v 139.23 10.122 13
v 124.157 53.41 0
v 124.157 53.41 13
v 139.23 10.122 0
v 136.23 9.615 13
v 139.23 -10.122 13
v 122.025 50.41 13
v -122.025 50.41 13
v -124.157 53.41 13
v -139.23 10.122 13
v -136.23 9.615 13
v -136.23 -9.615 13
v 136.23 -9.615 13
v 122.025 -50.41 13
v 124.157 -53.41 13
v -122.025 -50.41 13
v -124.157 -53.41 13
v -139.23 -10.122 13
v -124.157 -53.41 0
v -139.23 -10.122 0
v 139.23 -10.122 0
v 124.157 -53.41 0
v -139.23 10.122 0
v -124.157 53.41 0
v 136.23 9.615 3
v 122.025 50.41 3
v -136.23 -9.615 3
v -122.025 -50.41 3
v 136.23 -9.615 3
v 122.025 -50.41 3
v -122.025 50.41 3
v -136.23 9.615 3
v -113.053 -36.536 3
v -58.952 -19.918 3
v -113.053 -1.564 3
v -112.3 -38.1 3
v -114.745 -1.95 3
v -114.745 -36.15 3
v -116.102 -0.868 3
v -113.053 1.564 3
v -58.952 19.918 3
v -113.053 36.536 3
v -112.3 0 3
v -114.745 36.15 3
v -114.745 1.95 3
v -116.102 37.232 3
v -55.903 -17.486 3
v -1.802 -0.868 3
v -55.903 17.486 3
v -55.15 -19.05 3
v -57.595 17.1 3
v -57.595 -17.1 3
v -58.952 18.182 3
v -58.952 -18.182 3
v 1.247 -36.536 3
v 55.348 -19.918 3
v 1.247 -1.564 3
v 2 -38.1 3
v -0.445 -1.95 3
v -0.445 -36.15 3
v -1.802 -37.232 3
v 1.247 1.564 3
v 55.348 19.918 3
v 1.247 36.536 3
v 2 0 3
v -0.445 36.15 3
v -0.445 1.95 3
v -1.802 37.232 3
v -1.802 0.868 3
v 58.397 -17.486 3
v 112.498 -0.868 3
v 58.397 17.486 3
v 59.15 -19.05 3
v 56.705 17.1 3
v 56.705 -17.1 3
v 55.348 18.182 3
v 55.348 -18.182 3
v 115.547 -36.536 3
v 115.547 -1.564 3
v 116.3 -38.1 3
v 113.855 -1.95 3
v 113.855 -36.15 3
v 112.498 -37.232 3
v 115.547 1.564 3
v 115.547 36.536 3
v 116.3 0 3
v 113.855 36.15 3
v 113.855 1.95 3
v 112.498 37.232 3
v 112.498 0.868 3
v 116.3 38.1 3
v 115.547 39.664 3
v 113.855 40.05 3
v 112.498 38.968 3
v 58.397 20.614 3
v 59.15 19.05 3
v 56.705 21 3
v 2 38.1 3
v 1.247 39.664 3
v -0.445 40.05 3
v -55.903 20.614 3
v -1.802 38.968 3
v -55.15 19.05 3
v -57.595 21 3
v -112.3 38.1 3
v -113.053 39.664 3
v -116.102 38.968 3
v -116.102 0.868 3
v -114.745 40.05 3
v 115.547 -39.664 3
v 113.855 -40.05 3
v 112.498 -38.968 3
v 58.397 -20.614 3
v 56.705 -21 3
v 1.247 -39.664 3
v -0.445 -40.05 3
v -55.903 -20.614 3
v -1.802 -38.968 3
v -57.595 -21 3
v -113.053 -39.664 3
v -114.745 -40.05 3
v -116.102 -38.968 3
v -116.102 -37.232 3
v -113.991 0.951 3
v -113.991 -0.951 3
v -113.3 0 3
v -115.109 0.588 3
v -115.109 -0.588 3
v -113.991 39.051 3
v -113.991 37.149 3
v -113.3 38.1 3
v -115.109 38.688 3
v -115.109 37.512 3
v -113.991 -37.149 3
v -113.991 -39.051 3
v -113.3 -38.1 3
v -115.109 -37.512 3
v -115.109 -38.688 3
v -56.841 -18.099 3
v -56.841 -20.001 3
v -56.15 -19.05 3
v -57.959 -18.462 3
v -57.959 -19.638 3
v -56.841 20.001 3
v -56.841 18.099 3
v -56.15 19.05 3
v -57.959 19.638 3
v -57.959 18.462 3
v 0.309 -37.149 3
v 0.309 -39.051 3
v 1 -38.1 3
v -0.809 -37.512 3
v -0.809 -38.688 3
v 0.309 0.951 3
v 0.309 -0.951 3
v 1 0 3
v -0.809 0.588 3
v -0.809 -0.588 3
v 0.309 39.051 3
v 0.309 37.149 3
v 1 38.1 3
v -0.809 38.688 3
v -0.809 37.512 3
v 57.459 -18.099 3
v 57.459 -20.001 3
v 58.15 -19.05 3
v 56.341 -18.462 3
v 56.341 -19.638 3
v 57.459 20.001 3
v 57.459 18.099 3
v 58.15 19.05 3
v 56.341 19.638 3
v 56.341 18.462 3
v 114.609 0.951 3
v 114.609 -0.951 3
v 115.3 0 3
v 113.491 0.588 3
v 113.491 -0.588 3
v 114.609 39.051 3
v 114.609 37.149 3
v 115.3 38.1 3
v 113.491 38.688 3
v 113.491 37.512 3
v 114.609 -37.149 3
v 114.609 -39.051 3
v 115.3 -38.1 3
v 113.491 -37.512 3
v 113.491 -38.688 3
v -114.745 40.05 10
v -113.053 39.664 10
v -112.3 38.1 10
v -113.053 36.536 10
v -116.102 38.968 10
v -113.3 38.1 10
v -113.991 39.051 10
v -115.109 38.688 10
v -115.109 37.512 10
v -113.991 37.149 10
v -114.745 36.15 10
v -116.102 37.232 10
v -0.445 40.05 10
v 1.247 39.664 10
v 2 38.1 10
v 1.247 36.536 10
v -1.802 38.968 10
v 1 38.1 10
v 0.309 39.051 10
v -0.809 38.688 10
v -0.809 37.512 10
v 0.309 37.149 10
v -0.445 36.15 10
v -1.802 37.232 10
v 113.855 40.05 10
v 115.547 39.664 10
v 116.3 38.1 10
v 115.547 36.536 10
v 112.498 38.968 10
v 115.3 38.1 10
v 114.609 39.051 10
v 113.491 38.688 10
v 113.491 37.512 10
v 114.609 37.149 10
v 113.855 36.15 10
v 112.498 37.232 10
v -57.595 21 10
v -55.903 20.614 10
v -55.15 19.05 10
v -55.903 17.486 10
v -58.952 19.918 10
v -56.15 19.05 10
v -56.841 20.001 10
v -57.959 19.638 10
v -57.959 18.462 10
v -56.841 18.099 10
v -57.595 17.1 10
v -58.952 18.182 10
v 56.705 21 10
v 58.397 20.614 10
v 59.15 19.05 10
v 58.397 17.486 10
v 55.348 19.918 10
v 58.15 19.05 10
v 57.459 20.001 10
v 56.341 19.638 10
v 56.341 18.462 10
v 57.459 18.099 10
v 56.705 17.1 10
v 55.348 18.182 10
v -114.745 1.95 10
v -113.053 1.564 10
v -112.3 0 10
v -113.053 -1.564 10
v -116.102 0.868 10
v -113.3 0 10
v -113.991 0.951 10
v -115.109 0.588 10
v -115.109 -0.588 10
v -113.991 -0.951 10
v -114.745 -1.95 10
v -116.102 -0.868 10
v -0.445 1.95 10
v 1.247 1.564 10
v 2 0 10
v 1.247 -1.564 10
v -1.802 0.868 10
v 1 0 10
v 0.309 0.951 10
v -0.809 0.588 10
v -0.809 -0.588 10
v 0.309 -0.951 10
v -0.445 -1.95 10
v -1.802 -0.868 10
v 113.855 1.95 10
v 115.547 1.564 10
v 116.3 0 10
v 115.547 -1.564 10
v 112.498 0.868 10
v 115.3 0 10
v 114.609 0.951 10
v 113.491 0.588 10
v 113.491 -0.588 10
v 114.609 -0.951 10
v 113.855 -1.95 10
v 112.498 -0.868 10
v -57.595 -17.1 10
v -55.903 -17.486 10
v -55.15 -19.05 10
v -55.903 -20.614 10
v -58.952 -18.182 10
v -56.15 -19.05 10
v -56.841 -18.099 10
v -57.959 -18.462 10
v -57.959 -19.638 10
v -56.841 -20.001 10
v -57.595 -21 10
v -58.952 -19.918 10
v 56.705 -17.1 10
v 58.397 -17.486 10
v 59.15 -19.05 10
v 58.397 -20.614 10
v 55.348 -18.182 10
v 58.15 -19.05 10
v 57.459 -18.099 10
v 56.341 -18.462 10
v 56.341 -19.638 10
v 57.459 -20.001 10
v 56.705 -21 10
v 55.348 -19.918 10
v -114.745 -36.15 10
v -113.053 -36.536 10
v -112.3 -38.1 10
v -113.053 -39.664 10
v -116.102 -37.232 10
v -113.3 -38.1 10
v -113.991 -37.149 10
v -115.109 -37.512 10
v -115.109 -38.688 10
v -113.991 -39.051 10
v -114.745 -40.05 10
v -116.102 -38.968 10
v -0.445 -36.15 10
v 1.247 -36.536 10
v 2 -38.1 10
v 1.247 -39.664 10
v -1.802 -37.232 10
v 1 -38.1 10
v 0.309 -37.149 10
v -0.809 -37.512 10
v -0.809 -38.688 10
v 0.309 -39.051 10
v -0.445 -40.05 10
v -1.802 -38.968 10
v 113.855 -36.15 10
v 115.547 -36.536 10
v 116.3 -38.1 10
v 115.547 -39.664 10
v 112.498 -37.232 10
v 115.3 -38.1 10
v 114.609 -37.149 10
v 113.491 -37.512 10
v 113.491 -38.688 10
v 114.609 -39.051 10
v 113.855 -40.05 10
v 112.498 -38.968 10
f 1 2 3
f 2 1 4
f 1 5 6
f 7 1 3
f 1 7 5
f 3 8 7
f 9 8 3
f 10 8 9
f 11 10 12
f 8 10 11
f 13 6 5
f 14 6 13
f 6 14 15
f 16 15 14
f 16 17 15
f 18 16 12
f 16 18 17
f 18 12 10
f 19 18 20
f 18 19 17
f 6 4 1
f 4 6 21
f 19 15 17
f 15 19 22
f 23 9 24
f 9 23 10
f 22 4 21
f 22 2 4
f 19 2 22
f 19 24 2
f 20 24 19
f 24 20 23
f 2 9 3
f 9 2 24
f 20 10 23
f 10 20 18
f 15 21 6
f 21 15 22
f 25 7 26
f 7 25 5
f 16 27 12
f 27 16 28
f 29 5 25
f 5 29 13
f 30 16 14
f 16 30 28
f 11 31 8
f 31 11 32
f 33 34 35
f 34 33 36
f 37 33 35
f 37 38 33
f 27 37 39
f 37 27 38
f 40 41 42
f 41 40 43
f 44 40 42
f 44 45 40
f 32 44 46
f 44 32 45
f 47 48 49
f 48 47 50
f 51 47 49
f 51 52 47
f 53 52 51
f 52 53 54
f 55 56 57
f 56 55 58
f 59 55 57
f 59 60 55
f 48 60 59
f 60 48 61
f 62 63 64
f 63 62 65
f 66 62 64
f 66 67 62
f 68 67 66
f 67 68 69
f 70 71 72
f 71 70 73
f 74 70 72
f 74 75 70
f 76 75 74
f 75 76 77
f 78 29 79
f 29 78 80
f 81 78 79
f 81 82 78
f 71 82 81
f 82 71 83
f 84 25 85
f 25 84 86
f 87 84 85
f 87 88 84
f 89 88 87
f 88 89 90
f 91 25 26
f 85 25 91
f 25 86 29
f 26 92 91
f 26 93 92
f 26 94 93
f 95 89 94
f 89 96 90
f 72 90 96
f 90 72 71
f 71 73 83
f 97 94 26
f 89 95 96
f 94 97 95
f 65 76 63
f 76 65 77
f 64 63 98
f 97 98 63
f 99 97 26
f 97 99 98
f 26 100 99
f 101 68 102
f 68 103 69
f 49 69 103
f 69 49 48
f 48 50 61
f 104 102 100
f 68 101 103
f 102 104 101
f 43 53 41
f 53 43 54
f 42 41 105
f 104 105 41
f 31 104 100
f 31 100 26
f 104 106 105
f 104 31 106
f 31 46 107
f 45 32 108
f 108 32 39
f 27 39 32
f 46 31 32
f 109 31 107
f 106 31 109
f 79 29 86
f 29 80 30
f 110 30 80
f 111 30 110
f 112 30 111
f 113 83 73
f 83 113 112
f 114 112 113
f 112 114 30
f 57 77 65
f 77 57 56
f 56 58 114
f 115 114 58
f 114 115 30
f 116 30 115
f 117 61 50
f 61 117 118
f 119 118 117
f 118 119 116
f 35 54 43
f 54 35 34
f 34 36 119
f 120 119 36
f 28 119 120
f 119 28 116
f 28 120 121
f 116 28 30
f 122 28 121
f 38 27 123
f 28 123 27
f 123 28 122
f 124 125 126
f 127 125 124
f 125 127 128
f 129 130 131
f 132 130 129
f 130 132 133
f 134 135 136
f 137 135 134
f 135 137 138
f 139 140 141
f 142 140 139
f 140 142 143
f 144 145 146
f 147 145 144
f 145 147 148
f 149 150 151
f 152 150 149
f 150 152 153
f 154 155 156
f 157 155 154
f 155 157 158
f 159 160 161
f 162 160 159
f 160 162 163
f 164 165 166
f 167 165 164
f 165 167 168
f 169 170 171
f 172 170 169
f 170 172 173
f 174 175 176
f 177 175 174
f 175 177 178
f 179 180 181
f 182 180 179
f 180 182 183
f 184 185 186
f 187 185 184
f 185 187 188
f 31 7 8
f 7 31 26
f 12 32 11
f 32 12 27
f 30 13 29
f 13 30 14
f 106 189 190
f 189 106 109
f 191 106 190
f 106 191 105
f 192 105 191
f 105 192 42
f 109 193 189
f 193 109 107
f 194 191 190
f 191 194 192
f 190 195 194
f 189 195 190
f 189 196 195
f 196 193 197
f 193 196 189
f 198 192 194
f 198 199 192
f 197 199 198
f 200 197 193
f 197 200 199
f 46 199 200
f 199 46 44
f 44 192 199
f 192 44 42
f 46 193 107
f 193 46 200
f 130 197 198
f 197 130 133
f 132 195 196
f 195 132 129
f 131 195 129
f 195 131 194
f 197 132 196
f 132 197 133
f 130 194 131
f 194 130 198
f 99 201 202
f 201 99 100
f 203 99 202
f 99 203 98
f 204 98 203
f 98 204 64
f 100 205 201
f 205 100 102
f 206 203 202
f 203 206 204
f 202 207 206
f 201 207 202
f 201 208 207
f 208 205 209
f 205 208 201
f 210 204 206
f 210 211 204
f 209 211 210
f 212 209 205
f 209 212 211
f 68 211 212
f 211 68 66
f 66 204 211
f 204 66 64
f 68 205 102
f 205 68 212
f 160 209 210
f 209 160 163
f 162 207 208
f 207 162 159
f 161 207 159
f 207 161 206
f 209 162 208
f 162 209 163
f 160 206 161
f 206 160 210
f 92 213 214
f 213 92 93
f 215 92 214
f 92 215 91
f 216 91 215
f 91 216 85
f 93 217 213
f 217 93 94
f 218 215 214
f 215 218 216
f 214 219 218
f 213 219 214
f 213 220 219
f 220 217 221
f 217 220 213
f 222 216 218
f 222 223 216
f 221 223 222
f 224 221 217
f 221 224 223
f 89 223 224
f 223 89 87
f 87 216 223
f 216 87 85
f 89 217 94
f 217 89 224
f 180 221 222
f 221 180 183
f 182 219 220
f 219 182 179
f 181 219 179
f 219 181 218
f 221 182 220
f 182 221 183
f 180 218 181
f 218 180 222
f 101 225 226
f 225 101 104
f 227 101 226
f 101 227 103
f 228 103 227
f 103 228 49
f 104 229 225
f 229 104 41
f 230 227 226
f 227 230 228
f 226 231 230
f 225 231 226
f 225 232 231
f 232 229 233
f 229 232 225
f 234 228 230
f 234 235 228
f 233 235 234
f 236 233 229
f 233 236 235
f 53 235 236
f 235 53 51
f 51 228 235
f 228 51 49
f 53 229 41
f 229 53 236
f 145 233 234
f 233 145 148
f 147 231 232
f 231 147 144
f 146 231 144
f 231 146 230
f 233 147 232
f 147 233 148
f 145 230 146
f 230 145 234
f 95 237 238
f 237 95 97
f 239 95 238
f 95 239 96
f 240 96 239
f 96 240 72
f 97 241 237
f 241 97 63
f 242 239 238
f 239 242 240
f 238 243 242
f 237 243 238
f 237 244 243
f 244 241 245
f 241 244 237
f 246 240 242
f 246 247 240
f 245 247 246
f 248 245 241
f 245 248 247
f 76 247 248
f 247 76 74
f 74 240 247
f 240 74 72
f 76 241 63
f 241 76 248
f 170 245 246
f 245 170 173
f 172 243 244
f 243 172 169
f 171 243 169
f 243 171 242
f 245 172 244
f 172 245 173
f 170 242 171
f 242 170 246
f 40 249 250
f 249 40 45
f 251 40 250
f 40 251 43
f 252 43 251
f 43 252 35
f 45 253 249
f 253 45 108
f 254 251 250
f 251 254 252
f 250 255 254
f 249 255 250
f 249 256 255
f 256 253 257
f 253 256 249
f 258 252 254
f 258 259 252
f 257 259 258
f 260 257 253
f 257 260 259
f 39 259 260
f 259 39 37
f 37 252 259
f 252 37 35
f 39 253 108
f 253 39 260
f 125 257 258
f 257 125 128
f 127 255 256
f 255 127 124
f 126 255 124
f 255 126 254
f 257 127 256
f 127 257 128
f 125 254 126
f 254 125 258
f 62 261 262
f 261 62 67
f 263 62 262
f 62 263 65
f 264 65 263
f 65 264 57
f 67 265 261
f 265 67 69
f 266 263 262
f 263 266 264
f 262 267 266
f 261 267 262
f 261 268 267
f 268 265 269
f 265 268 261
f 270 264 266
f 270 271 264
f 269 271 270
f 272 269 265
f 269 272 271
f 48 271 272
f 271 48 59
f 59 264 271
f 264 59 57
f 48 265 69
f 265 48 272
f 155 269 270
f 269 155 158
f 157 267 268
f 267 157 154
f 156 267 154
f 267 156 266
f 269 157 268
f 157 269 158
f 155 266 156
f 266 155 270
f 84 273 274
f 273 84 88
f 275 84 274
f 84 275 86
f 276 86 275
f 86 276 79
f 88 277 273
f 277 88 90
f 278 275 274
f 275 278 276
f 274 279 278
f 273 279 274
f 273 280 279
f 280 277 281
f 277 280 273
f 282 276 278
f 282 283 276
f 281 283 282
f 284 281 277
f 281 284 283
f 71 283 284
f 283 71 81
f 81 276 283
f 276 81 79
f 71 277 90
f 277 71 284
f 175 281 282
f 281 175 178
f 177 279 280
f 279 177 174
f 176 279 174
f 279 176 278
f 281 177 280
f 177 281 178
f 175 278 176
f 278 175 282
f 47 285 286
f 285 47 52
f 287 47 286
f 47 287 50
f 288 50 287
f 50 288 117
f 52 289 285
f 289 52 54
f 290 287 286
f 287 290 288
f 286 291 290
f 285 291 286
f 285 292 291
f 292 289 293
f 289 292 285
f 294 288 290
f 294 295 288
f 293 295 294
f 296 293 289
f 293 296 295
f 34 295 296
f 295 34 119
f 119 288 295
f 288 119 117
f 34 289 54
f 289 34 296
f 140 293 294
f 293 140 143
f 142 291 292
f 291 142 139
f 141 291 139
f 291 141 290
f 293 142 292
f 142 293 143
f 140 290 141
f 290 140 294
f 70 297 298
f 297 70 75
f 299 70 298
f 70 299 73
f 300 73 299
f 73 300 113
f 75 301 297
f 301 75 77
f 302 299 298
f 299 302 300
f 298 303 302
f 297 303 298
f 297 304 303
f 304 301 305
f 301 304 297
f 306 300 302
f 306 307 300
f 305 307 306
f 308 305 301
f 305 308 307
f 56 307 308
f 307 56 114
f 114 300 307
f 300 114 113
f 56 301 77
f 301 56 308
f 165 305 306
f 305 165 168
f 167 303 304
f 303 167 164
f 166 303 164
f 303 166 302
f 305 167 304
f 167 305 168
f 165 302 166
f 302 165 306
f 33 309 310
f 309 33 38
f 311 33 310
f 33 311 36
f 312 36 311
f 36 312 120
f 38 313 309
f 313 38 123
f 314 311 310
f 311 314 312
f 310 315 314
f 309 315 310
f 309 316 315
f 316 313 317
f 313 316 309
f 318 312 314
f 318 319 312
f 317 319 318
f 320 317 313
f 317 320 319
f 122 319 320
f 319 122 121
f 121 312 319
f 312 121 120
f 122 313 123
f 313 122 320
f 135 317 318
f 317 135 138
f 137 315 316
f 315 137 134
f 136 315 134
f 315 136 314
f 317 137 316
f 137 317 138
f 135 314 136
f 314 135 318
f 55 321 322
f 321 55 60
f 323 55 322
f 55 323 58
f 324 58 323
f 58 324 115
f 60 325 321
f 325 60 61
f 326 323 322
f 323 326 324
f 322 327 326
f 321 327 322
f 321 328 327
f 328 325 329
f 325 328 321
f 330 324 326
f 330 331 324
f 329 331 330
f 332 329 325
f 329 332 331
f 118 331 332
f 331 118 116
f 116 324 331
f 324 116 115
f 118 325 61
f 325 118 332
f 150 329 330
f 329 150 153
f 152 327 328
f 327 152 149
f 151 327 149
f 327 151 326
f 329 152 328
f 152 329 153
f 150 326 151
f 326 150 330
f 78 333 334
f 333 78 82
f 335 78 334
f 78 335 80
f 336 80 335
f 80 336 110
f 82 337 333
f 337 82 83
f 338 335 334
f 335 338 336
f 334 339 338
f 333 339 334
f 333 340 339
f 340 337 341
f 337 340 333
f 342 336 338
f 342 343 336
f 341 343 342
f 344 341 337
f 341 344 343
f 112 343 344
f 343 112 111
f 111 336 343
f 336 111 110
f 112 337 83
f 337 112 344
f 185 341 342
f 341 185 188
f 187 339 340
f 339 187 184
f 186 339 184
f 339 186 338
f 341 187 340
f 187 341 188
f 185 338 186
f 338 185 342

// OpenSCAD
wall_thickness = 3;
margin = 0.5;

switch_dimension = 19.05;

hole_coordinates = [
    [-6,  2],           [0,  2],          [6,  2],
              [-3,  1],         [3, 1], 
    [-6,  0],           [0,  0],          [6,  0],
              [-3, -1],         [3, -1],
    [-6, -2],           [0, -2],          [6, -2]
] * switch_dimension;

union() {
    difference() {
        pcb(wall_thickness + margin, 13);
        translate([0, 0, 3]) pcb(margin, 10);
    }
    
    for (pos = hole_coordinates) {
        translate(pos)
        screwhole(2, 10);
    }
}

module pcb(margin, thickness) {
    u1 = [121.67, 49.91];
    r1 = [135.73, 9.53];
    
    normal = [u1[1] - r1[1], r1[0] - u1[0]];
    
    u2 = u1 + margin * normal / norm(normal);
    r2 = r1 + margin * normal / norm(normal);
    shifted_diagonal_line = cross(
        [u2[0], u2[1], 1],
        [r2[0], r2[1], 1]
    );
    
    upper_line = [0, 1, -u1[1] - margin];
    right_line = [1, 0, -r1[0] - margin];
    umarg_nonnorm = cross(upper_line, shifted_diagonal_line);
    rmarg_nonnorm = cross(right_line, shifted_diagonal_line);
    
    function xy(v) = [v[0], v[1]];

    umarg = xy(umarg_nonnorm) / umarg_nonnorm[2];
    rmarg = xy(rmarg_nonnorm) / rmarg_nonnorm[2];
    
    function mirrx(v) = [-v[0], v[1]];
    function mirry(v) = [v[0], -v[1]];
    
    linear_extrude(thickness) {
        polygon(
            points = [
                umarg, rmarg, mirry(rmarg), mirry(umarg),
                -umarg, -rmarg, mirrx(rmarg), mirrx(umarg)
            ]
        );
    }
}

module screwhole(diameter, height) {
    thickness = 1;
    difference() {
        cylinder(r=diameter/2 + thickness, h=height);
        cylinder(r=diameter/2, h=height);
    }
}
